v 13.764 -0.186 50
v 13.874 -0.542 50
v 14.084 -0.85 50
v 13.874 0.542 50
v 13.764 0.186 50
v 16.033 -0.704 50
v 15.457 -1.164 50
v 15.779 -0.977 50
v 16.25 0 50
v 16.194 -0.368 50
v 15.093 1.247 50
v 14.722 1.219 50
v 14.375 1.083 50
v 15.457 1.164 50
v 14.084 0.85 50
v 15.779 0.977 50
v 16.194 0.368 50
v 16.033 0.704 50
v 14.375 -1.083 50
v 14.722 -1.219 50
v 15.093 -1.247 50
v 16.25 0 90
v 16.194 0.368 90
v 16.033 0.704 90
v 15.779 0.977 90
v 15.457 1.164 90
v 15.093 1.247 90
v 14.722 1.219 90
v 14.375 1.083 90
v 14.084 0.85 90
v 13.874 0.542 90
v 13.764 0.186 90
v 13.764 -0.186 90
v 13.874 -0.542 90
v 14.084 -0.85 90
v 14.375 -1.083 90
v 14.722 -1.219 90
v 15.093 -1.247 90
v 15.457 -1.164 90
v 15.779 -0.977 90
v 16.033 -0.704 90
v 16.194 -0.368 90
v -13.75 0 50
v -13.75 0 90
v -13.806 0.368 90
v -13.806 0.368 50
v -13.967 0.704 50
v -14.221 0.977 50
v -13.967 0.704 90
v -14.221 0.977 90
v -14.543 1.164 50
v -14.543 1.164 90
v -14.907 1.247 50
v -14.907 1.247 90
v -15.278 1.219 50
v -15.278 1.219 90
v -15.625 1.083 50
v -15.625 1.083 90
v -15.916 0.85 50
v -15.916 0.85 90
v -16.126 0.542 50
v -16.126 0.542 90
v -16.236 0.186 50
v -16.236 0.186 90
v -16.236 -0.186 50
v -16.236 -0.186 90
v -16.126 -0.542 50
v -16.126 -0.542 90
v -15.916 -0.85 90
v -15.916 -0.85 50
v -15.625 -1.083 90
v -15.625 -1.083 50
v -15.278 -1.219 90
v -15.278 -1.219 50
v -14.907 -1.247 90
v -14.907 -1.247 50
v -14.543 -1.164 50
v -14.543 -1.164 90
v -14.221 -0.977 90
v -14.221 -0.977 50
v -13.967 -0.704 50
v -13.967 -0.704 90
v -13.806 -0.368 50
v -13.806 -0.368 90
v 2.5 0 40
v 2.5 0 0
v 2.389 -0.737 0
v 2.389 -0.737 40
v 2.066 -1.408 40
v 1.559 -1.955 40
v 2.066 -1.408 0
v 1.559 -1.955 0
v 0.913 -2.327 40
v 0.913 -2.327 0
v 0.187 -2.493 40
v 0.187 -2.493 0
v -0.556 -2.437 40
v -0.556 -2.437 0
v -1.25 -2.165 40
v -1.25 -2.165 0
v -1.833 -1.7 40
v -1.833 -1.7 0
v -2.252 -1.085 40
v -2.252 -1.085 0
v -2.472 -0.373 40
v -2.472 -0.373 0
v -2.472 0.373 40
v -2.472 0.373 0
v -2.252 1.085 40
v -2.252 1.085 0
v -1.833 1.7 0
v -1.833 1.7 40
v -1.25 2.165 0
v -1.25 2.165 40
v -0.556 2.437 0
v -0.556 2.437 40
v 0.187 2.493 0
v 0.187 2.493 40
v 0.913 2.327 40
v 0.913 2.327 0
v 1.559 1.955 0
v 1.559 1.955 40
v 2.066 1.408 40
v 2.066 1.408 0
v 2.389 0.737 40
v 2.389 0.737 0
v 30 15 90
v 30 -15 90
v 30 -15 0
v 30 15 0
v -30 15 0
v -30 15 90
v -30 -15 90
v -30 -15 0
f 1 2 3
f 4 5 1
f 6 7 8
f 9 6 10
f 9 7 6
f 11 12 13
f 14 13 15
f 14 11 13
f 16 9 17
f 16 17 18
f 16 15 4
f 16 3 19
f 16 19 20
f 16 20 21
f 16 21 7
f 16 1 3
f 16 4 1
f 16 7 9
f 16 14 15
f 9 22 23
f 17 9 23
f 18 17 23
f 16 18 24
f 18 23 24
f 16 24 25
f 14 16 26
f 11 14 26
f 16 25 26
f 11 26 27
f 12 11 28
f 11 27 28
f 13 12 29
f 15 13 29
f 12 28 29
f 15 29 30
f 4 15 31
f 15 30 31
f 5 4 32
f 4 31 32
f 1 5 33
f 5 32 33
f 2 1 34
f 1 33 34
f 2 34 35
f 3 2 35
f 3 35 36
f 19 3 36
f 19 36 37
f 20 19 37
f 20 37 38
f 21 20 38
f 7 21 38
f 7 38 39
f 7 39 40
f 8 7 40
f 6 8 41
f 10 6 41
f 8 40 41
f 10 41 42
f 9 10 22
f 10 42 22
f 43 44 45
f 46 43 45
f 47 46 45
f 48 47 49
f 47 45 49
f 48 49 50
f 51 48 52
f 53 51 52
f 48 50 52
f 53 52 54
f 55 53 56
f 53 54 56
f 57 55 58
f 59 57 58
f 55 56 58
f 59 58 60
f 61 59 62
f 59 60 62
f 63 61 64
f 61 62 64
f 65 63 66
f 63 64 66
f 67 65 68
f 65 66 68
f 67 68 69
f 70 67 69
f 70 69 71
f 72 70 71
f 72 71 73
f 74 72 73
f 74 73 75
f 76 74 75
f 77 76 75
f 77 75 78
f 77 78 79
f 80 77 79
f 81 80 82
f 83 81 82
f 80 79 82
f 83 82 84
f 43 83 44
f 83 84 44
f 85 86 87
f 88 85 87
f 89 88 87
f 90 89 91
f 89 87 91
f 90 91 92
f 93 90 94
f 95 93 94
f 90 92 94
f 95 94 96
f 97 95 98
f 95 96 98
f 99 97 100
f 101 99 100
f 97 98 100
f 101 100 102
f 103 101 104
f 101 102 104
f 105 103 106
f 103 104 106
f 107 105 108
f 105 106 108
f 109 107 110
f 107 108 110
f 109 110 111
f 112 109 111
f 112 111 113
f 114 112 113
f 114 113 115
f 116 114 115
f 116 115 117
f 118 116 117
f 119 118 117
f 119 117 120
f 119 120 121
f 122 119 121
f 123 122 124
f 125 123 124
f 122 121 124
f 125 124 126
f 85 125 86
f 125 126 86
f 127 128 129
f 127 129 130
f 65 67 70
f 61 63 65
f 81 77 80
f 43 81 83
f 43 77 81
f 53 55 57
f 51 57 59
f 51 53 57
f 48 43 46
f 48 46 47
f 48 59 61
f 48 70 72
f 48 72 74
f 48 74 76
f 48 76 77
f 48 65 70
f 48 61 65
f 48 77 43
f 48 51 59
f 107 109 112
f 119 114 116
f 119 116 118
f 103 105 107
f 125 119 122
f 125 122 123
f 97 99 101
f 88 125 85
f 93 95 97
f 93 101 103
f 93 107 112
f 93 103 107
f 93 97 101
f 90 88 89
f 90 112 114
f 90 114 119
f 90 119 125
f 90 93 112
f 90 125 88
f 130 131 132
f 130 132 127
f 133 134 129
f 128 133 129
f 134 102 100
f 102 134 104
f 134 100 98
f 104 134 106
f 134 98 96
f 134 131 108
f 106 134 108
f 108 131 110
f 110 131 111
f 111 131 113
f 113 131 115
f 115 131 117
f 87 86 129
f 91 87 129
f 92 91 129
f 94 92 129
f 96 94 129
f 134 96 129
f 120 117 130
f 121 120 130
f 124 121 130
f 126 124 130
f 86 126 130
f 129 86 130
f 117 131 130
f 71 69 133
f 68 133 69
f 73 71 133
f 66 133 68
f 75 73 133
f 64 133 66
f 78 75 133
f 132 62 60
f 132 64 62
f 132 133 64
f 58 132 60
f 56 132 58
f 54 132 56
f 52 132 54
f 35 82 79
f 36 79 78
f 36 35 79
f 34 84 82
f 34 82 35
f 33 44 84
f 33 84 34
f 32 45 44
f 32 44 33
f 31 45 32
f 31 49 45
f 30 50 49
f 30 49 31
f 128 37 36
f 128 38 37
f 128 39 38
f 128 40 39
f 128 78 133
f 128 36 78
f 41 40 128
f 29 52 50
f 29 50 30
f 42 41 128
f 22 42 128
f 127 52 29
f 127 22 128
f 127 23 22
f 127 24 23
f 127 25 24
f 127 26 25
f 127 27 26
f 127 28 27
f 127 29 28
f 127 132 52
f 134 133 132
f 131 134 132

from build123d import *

# Parameters (mm, degrees)
F0_W     = 60
F0_H     = 30
F1_DEPTH = 90
F2_R     = 2.5
F3_DEPTH = 40
F4_R     = 1.25
F5_DEPTH = 40


with BuildPart() as f1:
    # F0 (on Top) → F1 (new body)
    with BuildSketch(Plane.XY):
        Rectangle(F0_W, F0_H)
    extrude(amount=F1_DEPTH)

    # F2 (on face) → F3 (cut)
    with BuildSketch(Plane(origin=(0, 0, 0), x_dir=(1, 0, 0), z_dir=(0, 0, -1))):
        Circle(F2_R)
    extrude(amount=-F3_DEPTH, mode=Mode.SUBTRACT)

    # F4 (on face) → F5 (cut)
    with BuildSketch(Plane.XY.offset(90)):
        with Locations((-15, 0)):
            Circle(F4_R)
        with Locations((15, 0)):
            Circle(F4_R)
    extrude(amount=-F5_DEPTH, mode=Mode.SUBTRACT)


solid = f1.part
